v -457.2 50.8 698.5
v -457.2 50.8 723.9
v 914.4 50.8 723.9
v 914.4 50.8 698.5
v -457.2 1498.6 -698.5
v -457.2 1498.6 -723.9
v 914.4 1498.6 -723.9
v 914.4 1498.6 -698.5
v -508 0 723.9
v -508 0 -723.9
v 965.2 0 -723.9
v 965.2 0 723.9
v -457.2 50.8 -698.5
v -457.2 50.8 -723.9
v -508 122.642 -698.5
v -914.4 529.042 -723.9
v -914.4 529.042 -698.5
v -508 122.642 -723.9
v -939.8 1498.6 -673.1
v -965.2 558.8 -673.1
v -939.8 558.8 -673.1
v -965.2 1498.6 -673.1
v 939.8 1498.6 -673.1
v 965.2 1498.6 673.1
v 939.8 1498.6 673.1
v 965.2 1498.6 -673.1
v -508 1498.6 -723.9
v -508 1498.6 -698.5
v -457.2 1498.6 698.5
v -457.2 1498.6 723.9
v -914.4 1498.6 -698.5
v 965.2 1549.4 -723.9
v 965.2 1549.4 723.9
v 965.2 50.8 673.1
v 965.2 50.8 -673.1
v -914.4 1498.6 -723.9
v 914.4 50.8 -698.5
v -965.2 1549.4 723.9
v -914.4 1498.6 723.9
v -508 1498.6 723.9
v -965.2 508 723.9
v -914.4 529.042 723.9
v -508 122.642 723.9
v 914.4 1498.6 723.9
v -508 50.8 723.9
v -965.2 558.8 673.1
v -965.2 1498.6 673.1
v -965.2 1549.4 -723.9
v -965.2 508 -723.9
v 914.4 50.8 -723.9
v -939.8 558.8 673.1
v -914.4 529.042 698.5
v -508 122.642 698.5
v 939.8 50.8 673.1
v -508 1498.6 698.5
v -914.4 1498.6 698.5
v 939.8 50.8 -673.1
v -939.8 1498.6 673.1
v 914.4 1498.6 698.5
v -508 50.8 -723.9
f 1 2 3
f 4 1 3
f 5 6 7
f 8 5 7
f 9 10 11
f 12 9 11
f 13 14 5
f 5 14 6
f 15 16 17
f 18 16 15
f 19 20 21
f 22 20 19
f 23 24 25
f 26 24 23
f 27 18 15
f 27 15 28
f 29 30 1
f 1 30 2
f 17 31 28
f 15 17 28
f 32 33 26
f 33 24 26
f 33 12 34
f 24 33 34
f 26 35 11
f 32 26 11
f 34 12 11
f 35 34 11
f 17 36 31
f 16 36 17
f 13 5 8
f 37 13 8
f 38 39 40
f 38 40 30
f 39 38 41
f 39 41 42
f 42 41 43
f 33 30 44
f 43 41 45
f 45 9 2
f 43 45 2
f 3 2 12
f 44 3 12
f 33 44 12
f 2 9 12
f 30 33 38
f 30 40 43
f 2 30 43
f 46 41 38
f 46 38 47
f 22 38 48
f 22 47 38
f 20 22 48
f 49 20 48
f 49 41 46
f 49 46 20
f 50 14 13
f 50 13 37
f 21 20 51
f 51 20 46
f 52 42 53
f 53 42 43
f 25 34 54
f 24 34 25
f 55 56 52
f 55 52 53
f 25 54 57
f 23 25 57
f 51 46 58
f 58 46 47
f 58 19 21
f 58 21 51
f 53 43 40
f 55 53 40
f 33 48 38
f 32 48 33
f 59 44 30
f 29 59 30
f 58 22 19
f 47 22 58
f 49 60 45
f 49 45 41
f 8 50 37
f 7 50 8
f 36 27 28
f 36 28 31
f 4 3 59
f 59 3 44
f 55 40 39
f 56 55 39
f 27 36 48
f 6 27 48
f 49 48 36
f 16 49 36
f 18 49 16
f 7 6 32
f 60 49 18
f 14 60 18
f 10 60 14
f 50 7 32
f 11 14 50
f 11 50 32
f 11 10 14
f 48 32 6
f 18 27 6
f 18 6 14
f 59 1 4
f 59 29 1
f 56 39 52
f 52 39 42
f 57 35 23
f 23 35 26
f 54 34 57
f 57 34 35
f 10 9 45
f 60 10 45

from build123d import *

# Parameters (mm, degrees)
SKETCH1_W              = 1930.4
SKETCH1_H              = 1447.8
BOSS_EXTRUDE1_DEPTH    = 1549.4
CUT_EXTRUDE1_DEPTH     = 1447.8
CUT_EXTRUDE2_DEPTH     = 25.4
CUT_EXTRUDE3_START     = -1447.8
CUT_EXTRUDE3_OUTLINE_W = 1371.6
CUT_EXTRUDE3_OUTLINE_H = 1447.8
CUT_EXTRUDE3_DEPTH     = 25.4
SKETCH4_W              = 1346.2
SKETCH4_H              = 939.8
CUT_EXTRUDE4_DEPTH     = 25.4
SKETCH5_W              = 1346.2
SKETCH5_H              = 1447.8
CUT_EXTRUDE5_DEPTH     = 25.4


# Read off the part's stored shape, not the designer's step: Cut-Extrude3
with BuildPart() as part:
    # Sketch1 → Boss-Extrude1 (new body)
    with BuildSketch(Plane(origin=(0, 0, 0), x_dir=(1, 0, 0), z_dir=(0, 1, 0))):
        Rectangle(SKETCH1_W, SKETCH1_H)
    extrude(amount=BOSS_EXTRUDE1_DEPTH)

    # Sketch2 → Cut-Extrude1 (cut)
    with BuildSketch(Plane.XY.offset(723.9)):
        Polygon((-965.2, 0), (-508, 0), (-508, 50.8), (-965.2, 508), align=None)
    extrude(amount=-CUT_EXTRUDE1_DEPTH, mode=Mode.SUBTRACT)

    # Sketch3 → Cut-Extrude2 (cut)
    with BuildSketch(Plane.XY.offset(723.9)):
        Polygon((-914.4, 1498.6), (-914.4, 529.042048969), (-508, 122.642048969), (-508, 1498.6), align=None)
        Polygon((-457.2, 71.842048969), (-457.2, 50.8), (914.4, 50.8), (914.4, 1498.6), (-457.2, 1498.6), align=None)
    extrude(amount=-CUT_EXTRUDE2_DEPTH, mode=Mode.SUBTRACT)

    # Cut-Extrude3 outline → Cut-Extrude3 (cut)
    with BuildSketch(Plane.XY.offset(723.9).offset(CUT_EXTRUDE3_START)):
        Polygon((-508, 122.642048969), (-508, 1498.6), (-914.4, 1498.6), (-914.4, 529.042048969), align=None)
        with Locations((228.6, 774.7)):
            Rectangle(CUT_EXTRUDE3_OUTLINE_W, CUT_EXTRUDE3_OUTLINE_H)
    extrude(amount=CUT_EXTRUDE3_DEPTH, mode=Mode.SUBTRACT)

    # Sketch4 → Cut-Extrude4 (cut)
    with BuildSketch(Plane.ZY.offset(965.2)):
        with Locations((0, 1028.7)):
            Rectangle(SKETCH4_W, SKETCH4_H)
    extrude(amount=-CUT_EXTRUDE4_DEPTH, mode=Mode.SUBTRACT)

    # Sketch5 → Cut-Extrude5 (cut)
    with BuildSketch(Plane(origin=(965.2, 0, 0), x_dir=(0, 0, -1), z_dir=(1, 0, 0))):
        with Locations((0, 774.7)):
            Rectangle(SKETCH5_W, SKETCH5_H)
    extrude(amount=-CUT_EXTRUDE5_DEPTH, mode=Mode.SUBTRACT)


solid = part.part
